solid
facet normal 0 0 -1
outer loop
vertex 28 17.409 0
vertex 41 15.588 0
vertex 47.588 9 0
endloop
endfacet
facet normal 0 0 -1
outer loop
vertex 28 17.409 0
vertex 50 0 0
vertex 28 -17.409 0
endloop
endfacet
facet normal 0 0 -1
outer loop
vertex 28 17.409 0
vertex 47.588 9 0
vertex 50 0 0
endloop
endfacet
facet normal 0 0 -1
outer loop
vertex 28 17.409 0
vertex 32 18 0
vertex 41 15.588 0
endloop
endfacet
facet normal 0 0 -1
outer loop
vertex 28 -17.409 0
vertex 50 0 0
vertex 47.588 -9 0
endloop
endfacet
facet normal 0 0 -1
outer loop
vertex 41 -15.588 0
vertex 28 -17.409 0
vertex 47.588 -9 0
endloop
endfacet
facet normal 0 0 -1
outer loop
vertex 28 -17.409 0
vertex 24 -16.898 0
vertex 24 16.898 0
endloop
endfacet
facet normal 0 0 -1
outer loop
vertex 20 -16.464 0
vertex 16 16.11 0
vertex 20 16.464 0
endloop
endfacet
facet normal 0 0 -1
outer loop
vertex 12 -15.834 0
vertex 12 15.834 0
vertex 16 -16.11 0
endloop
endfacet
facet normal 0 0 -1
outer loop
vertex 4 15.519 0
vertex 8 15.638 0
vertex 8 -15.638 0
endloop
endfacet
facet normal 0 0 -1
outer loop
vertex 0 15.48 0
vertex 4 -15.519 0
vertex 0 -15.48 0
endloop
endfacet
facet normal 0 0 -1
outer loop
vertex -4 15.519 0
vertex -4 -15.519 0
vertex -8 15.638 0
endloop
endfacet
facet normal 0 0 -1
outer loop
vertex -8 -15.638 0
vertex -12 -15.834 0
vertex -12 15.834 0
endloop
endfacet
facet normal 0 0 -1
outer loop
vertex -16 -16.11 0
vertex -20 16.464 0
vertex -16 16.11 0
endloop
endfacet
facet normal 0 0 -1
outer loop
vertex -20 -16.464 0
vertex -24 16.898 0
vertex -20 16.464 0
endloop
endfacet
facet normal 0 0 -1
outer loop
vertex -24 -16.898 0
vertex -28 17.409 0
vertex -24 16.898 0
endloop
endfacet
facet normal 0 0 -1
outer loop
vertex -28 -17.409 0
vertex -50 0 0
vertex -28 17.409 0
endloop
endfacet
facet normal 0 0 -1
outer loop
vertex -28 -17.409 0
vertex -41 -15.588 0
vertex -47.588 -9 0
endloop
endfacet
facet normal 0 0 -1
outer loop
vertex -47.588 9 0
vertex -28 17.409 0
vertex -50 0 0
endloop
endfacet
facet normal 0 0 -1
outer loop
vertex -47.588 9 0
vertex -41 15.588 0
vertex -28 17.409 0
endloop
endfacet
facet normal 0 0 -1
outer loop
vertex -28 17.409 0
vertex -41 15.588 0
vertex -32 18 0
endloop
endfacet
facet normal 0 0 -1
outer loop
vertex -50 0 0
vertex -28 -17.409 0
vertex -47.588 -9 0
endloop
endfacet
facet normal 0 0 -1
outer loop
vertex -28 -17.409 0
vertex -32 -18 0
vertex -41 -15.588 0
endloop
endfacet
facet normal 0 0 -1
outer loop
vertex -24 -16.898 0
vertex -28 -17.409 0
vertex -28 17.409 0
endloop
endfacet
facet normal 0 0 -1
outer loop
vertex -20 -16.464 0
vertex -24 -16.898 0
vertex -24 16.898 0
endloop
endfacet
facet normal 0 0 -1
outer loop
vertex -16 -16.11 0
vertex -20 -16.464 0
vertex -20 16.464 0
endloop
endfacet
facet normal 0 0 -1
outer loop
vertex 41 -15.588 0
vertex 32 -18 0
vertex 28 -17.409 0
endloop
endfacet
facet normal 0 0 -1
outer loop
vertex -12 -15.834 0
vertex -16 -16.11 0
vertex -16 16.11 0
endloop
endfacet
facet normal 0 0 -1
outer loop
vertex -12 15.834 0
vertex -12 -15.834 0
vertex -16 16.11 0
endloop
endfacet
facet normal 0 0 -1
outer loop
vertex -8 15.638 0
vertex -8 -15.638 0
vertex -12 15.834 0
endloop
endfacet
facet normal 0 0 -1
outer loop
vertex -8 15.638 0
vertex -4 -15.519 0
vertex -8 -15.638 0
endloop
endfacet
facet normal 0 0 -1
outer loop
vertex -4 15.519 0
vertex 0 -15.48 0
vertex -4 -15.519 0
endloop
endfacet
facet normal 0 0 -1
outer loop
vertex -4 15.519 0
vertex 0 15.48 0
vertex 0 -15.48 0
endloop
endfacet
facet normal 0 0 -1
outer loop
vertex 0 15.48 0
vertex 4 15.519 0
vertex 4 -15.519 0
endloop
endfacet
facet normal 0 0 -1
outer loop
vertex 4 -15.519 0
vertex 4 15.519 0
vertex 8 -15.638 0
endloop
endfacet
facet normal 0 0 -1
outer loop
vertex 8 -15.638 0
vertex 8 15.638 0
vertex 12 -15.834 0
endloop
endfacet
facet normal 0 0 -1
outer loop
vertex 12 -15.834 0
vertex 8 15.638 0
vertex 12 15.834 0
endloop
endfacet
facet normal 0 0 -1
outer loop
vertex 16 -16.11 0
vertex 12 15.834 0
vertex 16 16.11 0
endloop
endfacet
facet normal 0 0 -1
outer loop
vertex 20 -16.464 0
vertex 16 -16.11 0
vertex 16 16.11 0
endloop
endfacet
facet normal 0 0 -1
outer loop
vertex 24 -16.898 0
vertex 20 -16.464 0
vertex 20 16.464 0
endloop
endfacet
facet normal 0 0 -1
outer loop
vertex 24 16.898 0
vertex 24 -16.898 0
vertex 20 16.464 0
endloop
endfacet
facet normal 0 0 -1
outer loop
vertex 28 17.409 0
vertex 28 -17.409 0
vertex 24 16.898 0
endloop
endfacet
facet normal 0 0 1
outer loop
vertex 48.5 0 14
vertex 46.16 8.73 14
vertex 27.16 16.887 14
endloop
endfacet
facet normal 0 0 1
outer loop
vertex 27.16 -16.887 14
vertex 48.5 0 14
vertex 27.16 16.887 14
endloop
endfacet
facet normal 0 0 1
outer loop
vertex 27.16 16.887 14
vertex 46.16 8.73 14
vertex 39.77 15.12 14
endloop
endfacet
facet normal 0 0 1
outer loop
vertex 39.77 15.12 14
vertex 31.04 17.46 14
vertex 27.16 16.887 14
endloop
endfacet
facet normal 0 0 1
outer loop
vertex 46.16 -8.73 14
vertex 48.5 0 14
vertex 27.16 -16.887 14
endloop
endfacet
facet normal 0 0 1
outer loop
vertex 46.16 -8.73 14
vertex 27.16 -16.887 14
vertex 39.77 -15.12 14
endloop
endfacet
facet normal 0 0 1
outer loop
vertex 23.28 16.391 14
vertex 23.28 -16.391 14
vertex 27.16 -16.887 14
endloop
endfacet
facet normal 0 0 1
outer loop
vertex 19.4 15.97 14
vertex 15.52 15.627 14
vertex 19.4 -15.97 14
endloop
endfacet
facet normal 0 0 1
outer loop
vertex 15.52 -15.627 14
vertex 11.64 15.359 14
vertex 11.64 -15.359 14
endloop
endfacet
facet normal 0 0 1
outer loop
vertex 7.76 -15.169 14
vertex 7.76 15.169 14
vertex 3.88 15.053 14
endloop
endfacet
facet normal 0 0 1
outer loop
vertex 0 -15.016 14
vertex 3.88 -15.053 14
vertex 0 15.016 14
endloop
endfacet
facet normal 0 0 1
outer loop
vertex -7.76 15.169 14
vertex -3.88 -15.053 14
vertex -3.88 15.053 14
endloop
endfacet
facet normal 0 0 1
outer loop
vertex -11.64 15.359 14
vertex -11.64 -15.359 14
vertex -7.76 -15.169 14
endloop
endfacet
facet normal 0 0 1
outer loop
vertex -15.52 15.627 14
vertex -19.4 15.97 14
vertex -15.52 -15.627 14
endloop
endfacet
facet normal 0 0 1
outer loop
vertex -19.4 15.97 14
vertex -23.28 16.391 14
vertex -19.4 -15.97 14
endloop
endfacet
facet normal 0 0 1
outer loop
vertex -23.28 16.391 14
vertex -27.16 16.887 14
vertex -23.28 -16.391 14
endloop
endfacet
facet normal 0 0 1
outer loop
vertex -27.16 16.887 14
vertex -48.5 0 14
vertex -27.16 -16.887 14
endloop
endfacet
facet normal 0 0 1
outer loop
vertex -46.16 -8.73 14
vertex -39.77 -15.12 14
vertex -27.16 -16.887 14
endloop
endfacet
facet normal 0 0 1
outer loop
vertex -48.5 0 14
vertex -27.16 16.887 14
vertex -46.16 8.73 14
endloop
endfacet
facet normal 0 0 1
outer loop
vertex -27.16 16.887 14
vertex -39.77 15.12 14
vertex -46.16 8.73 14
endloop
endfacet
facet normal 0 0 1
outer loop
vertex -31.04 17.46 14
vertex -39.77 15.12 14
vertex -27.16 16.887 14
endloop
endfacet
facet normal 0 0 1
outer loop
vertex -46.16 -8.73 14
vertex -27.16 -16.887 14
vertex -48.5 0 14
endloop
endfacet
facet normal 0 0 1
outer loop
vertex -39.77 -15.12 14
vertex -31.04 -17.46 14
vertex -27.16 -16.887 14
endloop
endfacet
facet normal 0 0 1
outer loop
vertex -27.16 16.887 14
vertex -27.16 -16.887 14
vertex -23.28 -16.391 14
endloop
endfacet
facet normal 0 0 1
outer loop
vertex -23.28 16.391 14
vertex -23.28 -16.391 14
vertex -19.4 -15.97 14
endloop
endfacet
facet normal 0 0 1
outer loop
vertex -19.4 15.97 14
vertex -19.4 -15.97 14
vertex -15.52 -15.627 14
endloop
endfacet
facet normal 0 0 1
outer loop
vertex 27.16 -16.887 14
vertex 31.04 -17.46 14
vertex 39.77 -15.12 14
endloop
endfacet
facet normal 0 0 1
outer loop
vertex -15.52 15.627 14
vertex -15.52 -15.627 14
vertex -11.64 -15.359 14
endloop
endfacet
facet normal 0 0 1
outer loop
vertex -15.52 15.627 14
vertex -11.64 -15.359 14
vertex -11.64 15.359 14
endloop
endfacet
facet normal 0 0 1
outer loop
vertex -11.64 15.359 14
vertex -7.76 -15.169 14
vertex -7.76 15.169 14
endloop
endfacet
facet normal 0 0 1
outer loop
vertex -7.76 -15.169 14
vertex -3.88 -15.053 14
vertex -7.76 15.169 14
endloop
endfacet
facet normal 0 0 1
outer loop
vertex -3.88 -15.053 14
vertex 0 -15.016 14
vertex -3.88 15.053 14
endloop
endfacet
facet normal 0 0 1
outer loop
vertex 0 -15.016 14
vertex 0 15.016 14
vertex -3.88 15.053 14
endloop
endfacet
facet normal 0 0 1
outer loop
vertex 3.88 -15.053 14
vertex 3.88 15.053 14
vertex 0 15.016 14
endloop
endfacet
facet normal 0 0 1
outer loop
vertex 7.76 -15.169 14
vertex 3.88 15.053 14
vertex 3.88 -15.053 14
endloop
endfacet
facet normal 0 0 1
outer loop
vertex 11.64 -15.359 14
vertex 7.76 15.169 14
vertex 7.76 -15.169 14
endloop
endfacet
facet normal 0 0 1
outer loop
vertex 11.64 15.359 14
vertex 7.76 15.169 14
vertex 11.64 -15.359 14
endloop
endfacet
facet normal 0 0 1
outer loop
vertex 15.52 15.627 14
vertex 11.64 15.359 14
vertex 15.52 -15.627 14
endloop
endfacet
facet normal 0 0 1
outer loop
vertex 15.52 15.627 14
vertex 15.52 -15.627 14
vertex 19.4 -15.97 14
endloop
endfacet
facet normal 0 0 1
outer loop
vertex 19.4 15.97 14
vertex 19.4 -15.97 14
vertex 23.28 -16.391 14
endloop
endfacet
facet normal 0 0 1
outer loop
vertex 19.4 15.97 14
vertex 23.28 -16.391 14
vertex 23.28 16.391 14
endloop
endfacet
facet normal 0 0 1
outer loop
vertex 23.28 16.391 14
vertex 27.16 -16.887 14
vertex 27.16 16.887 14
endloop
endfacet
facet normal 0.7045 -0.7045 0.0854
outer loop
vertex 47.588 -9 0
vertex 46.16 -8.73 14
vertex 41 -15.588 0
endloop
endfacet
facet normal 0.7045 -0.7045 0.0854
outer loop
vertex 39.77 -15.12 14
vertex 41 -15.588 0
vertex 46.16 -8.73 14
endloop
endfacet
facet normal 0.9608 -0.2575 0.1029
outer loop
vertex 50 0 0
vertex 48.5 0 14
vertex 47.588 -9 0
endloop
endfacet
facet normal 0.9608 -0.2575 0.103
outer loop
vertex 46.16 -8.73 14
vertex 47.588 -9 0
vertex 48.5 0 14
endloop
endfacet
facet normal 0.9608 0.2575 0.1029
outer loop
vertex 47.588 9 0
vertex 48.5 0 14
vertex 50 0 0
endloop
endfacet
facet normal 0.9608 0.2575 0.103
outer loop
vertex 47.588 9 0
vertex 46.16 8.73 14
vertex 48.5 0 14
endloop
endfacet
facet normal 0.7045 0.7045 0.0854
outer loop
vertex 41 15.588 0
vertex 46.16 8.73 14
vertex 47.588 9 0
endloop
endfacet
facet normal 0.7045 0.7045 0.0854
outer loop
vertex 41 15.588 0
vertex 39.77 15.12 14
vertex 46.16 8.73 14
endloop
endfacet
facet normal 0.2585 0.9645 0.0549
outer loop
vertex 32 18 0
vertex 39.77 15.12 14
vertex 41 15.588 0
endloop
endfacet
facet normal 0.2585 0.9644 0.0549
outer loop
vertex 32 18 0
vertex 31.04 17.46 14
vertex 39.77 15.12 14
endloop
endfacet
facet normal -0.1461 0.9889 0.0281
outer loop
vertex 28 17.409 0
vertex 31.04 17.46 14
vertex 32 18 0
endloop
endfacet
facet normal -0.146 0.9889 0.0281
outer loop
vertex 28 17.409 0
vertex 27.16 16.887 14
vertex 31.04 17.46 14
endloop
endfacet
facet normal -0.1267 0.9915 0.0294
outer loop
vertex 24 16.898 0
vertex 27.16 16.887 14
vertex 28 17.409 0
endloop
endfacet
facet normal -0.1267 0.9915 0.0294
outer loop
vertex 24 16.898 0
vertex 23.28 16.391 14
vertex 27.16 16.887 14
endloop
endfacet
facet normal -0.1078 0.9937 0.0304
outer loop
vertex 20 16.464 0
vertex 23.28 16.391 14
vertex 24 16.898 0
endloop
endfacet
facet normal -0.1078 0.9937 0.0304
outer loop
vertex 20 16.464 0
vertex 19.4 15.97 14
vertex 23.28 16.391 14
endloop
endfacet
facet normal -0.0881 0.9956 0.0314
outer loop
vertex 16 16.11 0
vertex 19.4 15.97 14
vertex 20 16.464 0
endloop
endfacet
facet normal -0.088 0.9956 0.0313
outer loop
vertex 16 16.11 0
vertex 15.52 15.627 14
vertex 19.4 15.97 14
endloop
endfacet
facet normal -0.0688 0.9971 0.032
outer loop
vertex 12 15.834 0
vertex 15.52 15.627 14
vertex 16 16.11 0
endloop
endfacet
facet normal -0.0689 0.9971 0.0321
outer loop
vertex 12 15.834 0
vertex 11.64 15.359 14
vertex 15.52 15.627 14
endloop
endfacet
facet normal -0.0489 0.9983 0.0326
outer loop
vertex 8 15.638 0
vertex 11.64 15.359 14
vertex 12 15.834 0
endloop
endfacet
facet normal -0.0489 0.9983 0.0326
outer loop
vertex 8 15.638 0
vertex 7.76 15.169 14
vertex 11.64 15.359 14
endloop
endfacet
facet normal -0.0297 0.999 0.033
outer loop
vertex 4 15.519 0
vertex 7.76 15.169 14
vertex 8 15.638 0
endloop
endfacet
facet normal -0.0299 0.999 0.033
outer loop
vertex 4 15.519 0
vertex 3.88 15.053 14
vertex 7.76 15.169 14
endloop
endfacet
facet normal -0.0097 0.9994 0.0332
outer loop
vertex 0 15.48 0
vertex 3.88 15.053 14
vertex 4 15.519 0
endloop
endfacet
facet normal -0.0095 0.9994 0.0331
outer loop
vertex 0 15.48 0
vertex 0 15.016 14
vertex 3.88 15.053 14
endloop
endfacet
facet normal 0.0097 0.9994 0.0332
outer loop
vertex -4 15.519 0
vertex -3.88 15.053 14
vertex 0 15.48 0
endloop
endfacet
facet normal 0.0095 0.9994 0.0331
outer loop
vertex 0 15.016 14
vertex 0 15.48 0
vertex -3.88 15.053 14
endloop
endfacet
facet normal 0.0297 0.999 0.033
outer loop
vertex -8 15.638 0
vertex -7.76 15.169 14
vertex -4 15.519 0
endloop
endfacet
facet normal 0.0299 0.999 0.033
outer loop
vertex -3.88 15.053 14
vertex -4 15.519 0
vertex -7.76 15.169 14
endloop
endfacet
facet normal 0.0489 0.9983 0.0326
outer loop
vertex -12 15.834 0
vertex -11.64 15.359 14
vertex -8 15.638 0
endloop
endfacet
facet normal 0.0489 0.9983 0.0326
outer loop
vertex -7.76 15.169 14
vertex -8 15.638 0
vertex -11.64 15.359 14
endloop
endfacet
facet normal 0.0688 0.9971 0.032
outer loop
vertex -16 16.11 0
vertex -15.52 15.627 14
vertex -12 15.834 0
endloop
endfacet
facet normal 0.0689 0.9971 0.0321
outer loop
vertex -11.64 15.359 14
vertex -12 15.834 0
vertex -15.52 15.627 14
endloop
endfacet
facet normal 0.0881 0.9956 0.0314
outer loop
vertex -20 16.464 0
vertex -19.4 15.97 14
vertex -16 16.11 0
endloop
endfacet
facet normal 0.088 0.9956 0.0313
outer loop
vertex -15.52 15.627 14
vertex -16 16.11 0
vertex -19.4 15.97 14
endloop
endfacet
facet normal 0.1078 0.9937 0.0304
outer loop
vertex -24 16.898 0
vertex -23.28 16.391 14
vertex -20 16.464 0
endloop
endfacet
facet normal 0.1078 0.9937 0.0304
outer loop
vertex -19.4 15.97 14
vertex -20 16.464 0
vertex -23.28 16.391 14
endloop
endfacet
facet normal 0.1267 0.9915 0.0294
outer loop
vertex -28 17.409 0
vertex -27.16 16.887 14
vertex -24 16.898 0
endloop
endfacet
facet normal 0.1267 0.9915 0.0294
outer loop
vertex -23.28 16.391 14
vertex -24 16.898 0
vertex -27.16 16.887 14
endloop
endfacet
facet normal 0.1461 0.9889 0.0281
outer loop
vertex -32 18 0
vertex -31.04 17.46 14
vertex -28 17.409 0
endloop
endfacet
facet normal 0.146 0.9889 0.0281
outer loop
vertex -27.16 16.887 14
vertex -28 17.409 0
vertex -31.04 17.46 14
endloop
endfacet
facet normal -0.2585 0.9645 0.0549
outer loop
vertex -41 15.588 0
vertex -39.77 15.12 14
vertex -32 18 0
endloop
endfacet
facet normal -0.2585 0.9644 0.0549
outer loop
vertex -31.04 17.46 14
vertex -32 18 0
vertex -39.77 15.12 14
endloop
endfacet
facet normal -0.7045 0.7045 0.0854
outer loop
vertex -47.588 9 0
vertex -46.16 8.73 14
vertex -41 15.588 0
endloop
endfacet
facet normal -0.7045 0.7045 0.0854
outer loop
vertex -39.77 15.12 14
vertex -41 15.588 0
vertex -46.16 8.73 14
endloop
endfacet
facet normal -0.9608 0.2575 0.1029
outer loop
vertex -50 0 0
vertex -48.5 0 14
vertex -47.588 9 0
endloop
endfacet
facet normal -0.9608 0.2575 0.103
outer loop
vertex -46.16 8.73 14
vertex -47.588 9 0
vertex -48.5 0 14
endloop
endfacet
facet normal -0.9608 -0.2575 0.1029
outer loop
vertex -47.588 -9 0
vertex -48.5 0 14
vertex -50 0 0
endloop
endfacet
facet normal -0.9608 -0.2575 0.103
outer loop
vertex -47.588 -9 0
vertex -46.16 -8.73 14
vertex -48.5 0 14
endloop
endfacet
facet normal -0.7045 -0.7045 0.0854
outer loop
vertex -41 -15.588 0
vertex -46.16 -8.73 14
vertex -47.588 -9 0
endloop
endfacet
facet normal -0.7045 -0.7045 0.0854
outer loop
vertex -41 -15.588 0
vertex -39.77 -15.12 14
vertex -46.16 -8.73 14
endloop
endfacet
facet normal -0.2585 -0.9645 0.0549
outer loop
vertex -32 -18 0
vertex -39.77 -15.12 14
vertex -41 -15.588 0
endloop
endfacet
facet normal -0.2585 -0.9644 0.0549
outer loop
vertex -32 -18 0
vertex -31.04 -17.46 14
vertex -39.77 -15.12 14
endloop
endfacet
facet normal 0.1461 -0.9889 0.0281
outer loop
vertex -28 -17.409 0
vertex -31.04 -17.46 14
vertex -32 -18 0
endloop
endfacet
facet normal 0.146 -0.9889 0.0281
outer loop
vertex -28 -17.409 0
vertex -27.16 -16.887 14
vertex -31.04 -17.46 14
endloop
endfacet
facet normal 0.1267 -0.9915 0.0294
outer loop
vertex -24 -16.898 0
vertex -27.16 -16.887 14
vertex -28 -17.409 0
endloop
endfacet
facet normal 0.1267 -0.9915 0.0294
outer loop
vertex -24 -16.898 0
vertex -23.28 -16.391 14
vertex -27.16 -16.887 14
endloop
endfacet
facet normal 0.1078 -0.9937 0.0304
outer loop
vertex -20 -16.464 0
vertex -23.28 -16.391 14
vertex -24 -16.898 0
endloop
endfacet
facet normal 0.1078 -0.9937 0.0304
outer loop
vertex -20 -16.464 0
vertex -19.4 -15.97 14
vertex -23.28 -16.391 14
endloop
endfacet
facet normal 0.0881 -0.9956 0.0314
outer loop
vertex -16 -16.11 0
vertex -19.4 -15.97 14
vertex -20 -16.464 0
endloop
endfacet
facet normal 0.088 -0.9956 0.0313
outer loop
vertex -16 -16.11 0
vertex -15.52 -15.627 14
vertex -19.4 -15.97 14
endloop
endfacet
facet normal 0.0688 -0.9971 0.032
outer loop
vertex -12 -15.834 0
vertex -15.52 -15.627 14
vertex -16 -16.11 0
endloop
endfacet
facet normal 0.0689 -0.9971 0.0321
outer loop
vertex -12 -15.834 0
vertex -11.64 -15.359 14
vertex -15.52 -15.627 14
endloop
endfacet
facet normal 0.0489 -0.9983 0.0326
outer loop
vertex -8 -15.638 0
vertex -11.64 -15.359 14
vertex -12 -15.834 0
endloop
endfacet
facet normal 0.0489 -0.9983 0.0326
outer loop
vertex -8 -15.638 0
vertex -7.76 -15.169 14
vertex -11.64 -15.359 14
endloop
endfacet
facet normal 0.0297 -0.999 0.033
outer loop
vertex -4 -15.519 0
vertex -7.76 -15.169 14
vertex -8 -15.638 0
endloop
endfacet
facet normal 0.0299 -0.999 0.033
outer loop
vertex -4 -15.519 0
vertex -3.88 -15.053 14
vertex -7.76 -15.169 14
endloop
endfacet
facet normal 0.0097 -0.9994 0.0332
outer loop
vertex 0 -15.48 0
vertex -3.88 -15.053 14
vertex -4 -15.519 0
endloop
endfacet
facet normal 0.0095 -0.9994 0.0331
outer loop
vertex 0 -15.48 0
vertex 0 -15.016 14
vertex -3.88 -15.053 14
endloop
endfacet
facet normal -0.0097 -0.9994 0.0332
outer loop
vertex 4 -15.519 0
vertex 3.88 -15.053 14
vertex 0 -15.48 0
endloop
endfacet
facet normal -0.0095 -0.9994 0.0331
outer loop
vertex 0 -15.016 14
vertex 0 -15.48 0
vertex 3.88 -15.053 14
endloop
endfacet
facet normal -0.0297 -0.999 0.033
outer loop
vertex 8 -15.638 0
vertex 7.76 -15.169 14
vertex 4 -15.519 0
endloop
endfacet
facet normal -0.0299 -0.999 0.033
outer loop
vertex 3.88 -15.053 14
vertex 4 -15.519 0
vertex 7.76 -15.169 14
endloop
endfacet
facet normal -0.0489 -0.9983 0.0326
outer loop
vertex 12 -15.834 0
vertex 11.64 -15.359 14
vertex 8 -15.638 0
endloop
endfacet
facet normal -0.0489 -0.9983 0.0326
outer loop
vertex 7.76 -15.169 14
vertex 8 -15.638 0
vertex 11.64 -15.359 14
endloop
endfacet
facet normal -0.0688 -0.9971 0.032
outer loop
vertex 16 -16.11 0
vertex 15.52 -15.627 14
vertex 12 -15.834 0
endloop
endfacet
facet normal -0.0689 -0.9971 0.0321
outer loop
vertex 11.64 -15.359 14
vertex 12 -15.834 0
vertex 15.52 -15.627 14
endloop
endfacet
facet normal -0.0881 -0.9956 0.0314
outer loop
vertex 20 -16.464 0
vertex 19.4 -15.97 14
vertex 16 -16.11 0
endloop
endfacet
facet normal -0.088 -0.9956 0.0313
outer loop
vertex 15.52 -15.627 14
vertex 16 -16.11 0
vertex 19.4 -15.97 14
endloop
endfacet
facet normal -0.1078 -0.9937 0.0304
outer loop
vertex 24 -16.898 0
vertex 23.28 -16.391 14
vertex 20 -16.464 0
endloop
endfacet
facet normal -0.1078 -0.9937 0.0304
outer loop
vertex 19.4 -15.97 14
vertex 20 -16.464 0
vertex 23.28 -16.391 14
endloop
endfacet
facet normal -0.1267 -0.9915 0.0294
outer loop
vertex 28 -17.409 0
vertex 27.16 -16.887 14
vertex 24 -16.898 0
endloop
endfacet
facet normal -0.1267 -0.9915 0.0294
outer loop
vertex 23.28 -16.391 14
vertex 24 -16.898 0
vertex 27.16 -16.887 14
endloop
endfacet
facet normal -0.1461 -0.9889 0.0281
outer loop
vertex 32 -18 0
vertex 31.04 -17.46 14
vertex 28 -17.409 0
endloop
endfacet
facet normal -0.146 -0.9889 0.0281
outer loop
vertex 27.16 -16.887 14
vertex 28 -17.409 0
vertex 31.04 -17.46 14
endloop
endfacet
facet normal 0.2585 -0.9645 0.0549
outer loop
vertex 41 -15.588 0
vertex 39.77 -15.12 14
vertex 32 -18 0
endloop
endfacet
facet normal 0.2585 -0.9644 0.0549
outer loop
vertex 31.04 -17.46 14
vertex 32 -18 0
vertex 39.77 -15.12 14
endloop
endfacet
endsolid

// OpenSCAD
$fn = 32;

// ----------------------------------------------------------------------
// Handle: 100 x 36 mm grip, 14 mm thick
// ----------------------------------------------------------------------

// --- parameters (mm) ---
length = 100;             // grip length
width = 36;               // grip width
thickness = 14;           // grip thickness
waist = 0.86;             // width factor at the middle
draft = 0.97;             // top face scale of the extrusion

/* ergonomic grip outline, closed spline-like polygon in the XY plane */
grip = [[-32, 18], [-28, 17.409], [-24, 16.898], [-20, 16.464], [-16, 16.11], [-12, 15.834], [-8, 15.638], [-4, 15.519], [0, 15.48], [4, 15.519], [8, 15.638], [12, 15.834], [16, 16.11], [20, 16.464], [24, 16.898], [28, 17.409], [32, 18], [41, 15.588], [47.588, 9], [50, 0], [47.588, -9], [41, -15.588], [32, -18], [32, -18], [28, -17.409], [24, -16.898], [20, -16.464], [16, -16.11], [12, -15.834], [8, -15.638], [4, -15.519], [0, -15.48], [-4, -15.519], [-8, -15.638], [-12, -15.834], [-16, -16.11], [-20, -16.464], [-24, -16.898], [-28, -17.409], [-32, -18], [-41, -15.588], [-47.588, -9], [-50, 0], [-47.588, 9], [-41, 15.588], [-32, 18]];

module grip_body() {
  linear_extrude(height = thickness, scale = draft) polygon(grip);
}

difference() {
  union() {
    grip_body();
  }
}
